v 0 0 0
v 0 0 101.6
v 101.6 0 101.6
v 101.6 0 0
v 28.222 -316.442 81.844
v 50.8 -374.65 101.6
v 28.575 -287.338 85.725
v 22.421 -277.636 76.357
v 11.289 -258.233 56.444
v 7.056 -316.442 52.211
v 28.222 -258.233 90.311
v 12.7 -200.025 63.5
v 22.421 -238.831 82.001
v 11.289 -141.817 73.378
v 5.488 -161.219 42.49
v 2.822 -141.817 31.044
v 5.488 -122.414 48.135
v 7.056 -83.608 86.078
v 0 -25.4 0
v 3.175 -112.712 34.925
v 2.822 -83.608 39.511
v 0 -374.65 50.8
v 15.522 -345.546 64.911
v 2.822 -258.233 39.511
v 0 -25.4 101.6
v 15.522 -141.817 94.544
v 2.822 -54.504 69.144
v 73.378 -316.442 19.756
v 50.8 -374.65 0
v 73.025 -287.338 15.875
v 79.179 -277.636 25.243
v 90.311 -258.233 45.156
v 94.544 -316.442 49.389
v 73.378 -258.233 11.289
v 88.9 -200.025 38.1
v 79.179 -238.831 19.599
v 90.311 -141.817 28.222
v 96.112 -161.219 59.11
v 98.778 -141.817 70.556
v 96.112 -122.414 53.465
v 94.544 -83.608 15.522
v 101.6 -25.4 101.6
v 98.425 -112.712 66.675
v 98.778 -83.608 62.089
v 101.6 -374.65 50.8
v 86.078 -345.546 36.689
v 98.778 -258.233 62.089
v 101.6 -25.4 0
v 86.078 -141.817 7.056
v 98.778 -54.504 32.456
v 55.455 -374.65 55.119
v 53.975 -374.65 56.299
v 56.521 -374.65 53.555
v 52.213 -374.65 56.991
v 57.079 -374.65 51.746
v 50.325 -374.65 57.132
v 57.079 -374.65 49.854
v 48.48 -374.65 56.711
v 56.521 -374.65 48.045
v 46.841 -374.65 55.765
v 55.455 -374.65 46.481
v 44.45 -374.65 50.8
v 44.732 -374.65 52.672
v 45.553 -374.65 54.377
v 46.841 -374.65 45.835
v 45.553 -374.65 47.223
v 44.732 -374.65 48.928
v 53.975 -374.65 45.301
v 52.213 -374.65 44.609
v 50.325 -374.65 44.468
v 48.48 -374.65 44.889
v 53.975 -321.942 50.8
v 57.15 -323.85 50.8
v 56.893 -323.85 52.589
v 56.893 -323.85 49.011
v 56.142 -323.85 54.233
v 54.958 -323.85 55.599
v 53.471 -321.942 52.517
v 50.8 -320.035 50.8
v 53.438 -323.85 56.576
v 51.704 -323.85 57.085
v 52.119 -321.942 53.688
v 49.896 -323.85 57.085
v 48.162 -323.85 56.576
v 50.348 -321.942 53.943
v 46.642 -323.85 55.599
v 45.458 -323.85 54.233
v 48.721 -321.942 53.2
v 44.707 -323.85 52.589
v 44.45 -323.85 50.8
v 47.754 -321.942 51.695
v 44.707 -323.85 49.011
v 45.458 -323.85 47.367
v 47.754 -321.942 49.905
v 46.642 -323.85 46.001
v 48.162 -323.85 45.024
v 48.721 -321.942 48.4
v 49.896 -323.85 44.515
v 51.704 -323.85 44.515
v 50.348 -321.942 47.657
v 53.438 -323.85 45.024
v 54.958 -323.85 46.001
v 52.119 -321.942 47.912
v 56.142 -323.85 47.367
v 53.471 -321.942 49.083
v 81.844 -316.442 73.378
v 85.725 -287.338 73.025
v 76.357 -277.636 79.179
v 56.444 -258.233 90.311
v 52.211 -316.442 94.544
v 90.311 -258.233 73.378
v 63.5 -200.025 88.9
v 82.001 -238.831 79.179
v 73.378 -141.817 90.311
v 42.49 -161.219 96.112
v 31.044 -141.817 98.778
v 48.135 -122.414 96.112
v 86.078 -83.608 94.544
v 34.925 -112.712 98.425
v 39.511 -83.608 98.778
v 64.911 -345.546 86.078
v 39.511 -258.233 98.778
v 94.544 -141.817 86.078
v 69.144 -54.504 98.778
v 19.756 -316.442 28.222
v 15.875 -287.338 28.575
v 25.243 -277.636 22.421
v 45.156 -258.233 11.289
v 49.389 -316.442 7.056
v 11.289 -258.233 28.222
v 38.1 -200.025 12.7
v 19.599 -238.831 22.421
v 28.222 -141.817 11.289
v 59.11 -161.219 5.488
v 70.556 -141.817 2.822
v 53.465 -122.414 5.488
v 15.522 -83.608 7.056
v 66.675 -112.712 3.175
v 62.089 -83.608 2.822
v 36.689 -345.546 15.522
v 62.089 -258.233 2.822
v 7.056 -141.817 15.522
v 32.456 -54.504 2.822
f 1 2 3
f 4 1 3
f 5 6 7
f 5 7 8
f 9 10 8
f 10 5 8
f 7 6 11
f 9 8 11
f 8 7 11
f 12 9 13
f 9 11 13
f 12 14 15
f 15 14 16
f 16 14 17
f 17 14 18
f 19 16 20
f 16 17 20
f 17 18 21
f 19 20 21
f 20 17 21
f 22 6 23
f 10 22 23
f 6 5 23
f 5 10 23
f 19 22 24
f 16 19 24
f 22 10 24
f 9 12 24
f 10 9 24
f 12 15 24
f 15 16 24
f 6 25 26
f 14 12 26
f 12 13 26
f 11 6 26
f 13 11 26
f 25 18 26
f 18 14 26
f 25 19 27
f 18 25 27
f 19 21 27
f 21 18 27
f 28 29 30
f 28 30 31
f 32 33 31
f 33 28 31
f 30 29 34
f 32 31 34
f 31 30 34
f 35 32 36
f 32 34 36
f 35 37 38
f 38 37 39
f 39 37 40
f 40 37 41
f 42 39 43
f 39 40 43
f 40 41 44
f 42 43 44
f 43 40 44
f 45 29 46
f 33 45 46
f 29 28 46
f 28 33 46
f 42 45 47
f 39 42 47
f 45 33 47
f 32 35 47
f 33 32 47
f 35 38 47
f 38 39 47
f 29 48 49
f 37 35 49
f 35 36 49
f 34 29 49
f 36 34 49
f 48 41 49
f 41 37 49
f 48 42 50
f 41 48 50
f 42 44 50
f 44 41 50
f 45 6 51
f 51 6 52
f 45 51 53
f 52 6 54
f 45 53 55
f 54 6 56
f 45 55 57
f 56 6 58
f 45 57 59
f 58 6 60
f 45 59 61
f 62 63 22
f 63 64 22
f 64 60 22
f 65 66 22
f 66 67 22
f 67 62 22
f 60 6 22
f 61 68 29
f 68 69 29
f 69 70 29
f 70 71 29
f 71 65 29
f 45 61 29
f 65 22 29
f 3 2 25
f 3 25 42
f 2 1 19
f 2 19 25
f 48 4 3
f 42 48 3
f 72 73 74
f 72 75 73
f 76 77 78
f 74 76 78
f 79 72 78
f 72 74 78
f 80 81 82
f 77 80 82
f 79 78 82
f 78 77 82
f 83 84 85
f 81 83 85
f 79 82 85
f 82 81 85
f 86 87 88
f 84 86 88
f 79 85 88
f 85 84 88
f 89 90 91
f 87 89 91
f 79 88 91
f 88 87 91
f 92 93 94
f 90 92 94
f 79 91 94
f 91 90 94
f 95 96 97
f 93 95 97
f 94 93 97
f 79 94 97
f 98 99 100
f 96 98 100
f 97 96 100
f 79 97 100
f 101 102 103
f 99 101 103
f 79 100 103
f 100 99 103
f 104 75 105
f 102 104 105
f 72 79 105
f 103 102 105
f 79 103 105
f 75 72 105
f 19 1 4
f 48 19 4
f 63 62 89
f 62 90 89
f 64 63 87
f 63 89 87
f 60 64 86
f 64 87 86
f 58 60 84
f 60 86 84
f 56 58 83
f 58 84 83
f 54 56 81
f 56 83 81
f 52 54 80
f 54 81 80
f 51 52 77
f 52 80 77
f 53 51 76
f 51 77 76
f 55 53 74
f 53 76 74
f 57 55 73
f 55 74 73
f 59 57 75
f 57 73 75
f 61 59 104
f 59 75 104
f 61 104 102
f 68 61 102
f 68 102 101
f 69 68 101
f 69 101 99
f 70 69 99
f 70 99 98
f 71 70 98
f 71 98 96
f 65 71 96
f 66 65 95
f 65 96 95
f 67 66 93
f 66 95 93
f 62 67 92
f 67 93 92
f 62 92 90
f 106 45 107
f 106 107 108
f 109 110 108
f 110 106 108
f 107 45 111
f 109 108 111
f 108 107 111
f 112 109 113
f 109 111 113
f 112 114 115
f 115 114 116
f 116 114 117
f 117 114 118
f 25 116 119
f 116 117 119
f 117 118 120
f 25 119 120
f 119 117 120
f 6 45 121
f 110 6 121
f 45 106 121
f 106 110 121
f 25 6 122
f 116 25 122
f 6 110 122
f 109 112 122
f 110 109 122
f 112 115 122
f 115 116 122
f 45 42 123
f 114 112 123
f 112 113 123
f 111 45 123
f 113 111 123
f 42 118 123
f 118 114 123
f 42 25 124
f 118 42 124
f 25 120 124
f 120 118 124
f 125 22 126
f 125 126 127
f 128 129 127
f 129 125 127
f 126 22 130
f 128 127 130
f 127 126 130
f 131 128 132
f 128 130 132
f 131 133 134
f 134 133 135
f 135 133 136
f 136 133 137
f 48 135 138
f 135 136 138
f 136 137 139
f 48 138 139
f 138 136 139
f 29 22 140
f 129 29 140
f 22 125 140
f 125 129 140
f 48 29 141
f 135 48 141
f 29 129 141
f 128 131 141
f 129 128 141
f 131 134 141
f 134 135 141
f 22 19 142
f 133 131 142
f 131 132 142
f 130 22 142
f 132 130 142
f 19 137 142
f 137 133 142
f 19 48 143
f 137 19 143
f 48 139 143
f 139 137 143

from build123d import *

# Parameters (mm, degrees)
F0_W      = 101.6
F0_H      = 101.6
F1_DEPTH  = 25.4
F1_FACE_W = 101.6
F1_FACE_H = 101.6
F6_D      = 12.7
F6_DEPTH  = 50.8
F6_TIP    = 3.8154649308


with BuildPart() as f1:
    # F0 (on Front) → F1 (new body)
    with BuildSketch(Plane.XZ):
        with Locations((50.8, 50.8)):
            Rectangle(F0_W, F0_H)
    extrude(amount=F1_DEPTH)

    # F3 (on offset) → F4 section 0
    with BuildSketch(Plane.XZ.offset(374.65)):
        Polygon((50.8, 101.6), (0, 50.8), (50.8, 0), (101.6, 50.8), align=None)
    # F1_face (on face) → F4 section 1
    with BuildSketch(Plane(origin=(50.8, -25.4, 50.8), x_dir=(1, 0, 0), z_dir=(0, -1, 0))):
        Rectangle(F1_FACE_W, F1_FACE_H)
    loft()

    # F6
    with Locations(Plane.XZ.offset(374.65)):
        with Locations((50.8, 50.8)):
            Hole(F6_D / 2, depth=F6_DEPTH)
            with Locations((0, 0, -(F6_DEPTH + F6_TIP / 2))):  # 118° drill point
                Cone(0, F6_D / 2, F6_TIP, mode=Mode.SUBTRACT)


solid = f1.part
